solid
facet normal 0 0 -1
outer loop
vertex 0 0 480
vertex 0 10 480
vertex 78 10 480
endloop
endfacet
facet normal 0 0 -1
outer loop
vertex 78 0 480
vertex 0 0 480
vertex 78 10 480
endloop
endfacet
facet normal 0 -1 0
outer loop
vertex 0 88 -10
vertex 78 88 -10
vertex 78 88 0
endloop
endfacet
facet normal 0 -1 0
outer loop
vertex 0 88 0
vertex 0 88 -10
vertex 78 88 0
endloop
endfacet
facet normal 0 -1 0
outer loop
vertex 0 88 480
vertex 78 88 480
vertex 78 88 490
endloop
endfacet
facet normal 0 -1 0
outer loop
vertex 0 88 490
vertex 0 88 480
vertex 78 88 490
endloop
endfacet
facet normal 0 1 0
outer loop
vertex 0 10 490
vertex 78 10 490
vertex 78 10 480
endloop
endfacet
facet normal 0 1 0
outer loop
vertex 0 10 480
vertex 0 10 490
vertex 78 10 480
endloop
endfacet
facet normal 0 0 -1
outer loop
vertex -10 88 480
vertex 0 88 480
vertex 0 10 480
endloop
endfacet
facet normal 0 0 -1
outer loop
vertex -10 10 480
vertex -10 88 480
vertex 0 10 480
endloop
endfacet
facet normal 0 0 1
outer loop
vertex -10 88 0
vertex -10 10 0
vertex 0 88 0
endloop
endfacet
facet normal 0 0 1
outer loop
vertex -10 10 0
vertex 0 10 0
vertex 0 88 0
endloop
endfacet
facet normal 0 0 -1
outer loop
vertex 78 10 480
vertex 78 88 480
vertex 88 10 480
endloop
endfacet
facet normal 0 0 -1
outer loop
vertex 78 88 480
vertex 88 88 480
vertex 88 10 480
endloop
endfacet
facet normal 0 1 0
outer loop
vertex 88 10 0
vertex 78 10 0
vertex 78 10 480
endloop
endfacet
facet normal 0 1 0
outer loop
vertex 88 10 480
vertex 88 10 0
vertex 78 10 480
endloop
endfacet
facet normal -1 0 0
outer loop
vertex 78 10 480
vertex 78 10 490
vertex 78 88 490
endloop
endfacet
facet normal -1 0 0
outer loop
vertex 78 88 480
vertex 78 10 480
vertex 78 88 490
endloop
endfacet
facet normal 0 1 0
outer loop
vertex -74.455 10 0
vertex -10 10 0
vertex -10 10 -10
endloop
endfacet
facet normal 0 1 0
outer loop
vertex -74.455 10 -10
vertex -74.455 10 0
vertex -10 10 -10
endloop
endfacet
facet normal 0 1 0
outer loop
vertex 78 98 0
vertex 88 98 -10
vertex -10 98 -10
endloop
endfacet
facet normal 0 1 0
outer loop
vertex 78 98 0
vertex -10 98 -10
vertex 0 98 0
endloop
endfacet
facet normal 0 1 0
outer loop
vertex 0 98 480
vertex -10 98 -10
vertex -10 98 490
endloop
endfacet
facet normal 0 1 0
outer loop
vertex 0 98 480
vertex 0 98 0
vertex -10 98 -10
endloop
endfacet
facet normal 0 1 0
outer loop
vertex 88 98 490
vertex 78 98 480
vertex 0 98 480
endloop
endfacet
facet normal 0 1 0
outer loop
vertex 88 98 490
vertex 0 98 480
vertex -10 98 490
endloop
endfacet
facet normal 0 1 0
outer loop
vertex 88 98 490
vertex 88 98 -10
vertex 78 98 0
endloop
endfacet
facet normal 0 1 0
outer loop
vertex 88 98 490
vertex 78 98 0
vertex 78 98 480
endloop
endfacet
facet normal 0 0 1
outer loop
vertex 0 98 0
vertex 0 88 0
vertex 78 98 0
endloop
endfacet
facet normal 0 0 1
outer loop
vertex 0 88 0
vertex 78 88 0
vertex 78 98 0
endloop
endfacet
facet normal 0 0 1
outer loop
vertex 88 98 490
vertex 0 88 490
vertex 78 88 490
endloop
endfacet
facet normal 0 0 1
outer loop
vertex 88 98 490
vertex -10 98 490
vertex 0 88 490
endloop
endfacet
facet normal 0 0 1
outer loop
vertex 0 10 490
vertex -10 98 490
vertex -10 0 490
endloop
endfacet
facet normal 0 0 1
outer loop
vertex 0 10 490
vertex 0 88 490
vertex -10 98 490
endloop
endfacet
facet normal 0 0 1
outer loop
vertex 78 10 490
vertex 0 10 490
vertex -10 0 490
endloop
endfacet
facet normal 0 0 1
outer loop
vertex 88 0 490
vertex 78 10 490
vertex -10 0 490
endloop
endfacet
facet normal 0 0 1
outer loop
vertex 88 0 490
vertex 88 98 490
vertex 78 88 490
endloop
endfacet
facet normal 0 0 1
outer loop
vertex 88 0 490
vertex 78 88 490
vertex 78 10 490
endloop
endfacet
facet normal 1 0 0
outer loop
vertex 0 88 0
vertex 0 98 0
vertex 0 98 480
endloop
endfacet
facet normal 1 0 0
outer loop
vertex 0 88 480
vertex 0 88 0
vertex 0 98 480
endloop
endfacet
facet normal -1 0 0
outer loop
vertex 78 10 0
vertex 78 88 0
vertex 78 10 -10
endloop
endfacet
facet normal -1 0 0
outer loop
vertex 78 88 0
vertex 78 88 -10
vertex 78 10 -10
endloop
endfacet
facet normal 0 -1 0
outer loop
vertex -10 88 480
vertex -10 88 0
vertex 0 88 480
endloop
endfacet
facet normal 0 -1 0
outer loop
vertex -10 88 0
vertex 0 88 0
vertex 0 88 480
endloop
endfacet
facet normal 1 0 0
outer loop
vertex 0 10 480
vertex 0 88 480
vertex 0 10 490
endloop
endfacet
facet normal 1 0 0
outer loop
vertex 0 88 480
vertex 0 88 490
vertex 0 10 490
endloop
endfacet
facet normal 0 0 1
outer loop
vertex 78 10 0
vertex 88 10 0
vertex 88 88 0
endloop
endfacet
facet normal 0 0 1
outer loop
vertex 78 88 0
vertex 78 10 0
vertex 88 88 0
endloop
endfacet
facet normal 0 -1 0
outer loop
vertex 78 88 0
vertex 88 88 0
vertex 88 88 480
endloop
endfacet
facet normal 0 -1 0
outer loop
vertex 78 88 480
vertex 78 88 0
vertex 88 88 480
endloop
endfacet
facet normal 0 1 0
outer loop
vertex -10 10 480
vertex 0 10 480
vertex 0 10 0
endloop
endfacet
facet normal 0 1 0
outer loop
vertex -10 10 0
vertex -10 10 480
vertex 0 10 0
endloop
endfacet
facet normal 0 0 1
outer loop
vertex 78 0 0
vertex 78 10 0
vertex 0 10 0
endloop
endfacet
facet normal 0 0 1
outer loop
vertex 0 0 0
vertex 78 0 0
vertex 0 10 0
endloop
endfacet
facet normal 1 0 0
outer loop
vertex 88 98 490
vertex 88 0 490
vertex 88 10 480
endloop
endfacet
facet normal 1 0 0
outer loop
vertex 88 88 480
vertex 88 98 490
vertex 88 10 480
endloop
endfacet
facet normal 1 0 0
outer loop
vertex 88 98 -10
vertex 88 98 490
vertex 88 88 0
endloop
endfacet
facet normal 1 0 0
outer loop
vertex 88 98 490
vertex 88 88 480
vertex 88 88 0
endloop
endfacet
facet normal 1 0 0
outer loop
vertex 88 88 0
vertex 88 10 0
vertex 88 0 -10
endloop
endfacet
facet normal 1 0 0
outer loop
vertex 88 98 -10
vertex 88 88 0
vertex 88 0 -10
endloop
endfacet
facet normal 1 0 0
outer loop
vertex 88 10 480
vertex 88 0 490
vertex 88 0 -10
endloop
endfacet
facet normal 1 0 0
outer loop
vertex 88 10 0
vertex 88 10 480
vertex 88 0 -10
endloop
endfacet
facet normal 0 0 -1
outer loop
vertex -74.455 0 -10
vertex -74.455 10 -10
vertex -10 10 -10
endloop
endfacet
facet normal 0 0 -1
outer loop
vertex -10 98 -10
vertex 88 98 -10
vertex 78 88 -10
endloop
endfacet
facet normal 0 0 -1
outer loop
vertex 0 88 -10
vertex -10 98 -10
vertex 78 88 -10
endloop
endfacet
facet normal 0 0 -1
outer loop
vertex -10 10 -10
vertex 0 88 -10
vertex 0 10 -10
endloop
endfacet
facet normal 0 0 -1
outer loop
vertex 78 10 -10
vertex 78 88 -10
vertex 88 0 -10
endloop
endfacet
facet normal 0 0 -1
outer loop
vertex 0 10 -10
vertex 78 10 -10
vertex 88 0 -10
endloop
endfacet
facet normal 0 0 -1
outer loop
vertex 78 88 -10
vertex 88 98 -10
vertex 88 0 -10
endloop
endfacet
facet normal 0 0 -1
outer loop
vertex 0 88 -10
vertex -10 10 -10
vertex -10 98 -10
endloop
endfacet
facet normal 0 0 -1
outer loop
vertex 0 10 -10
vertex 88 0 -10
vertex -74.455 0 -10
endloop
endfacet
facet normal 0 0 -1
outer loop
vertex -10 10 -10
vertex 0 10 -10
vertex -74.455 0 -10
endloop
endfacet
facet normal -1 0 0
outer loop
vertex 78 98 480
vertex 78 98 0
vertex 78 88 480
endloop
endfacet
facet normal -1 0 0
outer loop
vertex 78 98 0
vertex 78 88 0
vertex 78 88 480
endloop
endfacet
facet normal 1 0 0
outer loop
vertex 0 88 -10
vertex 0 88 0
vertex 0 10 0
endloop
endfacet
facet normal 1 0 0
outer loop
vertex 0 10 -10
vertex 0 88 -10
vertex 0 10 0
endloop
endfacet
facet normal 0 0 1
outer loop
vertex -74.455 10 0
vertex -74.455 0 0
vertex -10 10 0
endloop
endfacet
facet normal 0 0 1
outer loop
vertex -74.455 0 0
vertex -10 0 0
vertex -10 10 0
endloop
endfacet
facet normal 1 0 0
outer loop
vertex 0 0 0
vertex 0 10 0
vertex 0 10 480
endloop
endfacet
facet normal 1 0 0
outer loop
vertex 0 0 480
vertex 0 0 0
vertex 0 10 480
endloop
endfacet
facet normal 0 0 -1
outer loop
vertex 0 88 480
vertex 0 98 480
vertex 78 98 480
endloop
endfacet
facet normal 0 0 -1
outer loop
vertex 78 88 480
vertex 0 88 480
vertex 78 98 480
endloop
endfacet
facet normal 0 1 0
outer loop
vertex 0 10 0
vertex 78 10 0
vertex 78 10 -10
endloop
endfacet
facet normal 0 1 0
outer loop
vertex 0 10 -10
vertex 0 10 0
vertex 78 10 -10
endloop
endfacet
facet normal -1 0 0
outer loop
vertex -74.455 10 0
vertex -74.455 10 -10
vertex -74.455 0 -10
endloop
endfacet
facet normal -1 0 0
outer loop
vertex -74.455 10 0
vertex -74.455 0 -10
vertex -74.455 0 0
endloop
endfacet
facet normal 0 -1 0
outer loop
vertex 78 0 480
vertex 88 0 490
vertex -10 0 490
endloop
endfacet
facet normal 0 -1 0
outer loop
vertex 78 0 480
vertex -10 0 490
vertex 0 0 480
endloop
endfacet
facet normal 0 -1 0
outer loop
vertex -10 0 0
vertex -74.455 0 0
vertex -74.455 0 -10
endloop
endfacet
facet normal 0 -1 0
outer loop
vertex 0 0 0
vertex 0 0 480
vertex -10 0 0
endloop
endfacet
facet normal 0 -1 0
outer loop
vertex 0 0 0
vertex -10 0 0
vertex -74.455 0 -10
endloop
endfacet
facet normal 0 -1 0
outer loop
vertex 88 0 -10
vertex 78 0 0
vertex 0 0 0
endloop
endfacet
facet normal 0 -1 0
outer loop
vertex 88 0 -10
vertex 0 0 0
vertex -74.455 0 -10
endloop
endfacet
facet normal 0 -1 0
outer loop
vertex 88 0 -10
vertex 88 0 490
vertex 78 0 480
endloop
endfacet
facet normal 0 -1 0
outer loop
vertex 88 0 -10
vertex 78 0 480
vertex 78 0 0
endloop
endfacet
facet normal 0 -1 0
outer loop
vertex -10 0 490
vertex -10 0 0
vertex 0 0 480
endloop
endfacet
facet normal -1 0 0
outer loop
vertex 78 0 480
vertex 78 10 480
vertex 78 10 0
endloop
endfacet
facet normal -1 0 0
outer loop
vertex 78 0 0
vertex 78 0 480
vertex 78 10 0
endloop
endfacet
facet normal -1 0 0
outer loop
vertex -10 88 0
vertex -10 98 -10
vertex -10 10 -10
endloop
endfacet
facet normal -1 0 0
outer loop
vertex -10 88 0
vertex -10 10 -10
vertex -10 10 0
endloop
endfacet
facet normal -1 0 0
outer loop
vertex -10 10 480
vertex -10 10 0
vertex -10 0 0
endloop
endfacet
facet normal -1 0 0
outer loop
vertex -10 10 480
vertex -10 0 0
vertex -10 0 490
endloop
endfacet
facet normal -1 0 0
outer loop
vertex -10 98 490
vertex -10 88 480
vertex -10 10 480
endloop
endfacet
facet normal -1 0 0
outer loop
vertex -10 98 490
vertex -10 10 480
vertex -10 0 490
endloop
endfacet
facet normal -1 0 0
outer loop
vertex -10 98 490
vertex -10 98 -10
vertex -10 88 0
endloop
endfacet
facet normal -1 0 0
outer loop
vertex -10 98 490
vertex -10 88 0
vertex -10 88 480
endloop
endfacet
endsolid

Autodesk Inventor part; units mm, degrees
ref_plane "YZ Plane" through (0, 0, 0) normal (1, 0, 0) x (0, 1, 0)
ref_plane "XZ Plane" through (0, 0, 0) normal (0, 1, 0) x (-1, 0, 0)
ref_plane "XY Plane" through (0, 0, 0) normal (0, 0, 1) x (1, 0, 0)
sketch "Sketch1" plane through (0, 0, 0) normal (0, 0, 1) x (1, 0, 0)
  line L0 (0, 0) -> (68, 0)
  line L1 (68, 0) -> (68, 68)
  line L2 (68, 68) -> (0, 68)
  line L3 (0, 68) -> (0, 0)
  dimension "d1" = 68
  dimension "d2" = 68
extrude "Extrusion1" add sketch "Sketch1" along normal blind 480
sketch "Sketch2" plane through (0, 0, 480) normal (0, 0, 1) x (1, 0, 0)
  line L0 (10, 58) -> (58, 58)
  line L1 (58, 58) -> (58, 10)
  line L2 (58, 10) -> (10, 10)
  line L3 (10, 10) -> (10, 58)
  line L4 (68, 68) -> (0, 68) projected
  line L5 (0, 68) -> (0, 0) projected
  line L6 (0, 0) -> (68, 0) projected
  line L7 (68, 0) -> (68, 68) projected
  dimension "d5" = 10
  dimension "d6" = 10
  dimension "d7" = 10
  dimension "d8" = 10
extrude "Extrusion2" cut sketch "Sketch2" against normal blind 900 contours L0 L1 L2 L3
sketch "Sketch3" plane through (68, 0, 0) normal (1, 0, 0) x (0, 0, -1)
  line L0 (-470, 58) -> (-10, 58)
  line L1 (-10, 58) -> (-10, 10)
  line L2 (-10, 10) -> (-470, 10)
  line L3 (-470, 10) -> (-470, 58)
  line L4 (0, 68) -> (-480, 68) projected
  line L5 (-480, 0) -> (-480, 68) projected
  line L6 (0, 0) -> (-480, 0) projected
  line L7 (0, 0) -> (0, 68) projected
  dimension "d11" = 10
  dimension "d12" = 10
  dimension "d13" = 10
  dimension "d14" = 10
extrude "Extrusion3" cut sketch "Sketch3" against normal blind 900 contours L0 L1 L2 L3
sketch "Sketch4" plane through (0, 68, 0) normal (0, 1, 0) x (1, 0, 0)
  line L0 (68, -10) -> (58, -10) projected
  line L1 (10, -480) -> (10, -470) projected
  line L2 (58, -10) -> (10, -10)
  line L3 (10, -10) -> (10, -470)
  line L4 (10, -470) -> (58, -470)
  line L5 (58, -470) -> (58, -10)
  point P0 (0, 0)
extrude "Extrusion4" cut sketch "Sketch4" against normal blind 900
sketch "Sketch5" plane through (0, 0, 480) normal (0, 0, 1) x (1, 0, 0)
  line L0 (68, 68) -> (0, 68) projected
  line L1 (0, 0) -> (68, 0) projected
  line L2 (0, 68) -> (68, 68)
  line L3 (68, 68) -> (68, 0)
  line L4 (68, 0) -> (0, 0)
  line L5 (0, 0) -> (0, 68)
  line L6 (10, 58) -> (0, 58) projected
  line L7 (58, 58) -> (58, 10) projected
  line L8 (10, 58) -> (58, 58)
  line L9 (58, 58) -> (58, 10)
  line L10 (58, 10) -> (10, 10)
  line L11 (10, 10) -> (10, 58)
extrude "Extrusion5" add sketch "Sketch5" along normal blind 10
sketch "Sketch6" plane through (0, 68, 0) normal (0, 1, 0) x (1, 0, 0)
  line L0 (58, -490) -> (58, -470) projected
  line L1 (10, -490) -> (10, -470) projected
  line L2 (58, -470) -> (10, -470)
  line L3 (10, -470) -> (10, -480)
  line L4 (10, -480) -> (58, -480)
  line L5 (58, -480) -> (58, -470)
  point P0 (0, 0)
extrude "Extrusion6" cut sketch "Sketch6" against normal blind 900
sketch "Sketch7" plane through (68, 0, 0) normal (1, 0, 0) x (0, 0, -1)
  line L0 (-470, 10) -> (-470, 58) projected
  line L1 (-480, 10) -> (-480, 0) projected
  line L2 (-470, 58) -> (-480, 58)
  line L3 (-480, 58) -> (-480, 10)
  line L4 (-480, 10) -> (-470, 10)
  line L5 (-470, 10) -> (-470, 58)
  point P0 (0, 0)
extrude "Extrusion7" cut sketch "Sketch7" against normal blind 900
sketch "Sketch8" plane through (0, 0, 0) normal (0, 0, -1) x (-1, 0, 0)
  line L0 (-68, 0) -> (-68, 68) projected
  line L1 (-68, 68) -> (0, 68)
  line L2 (0, 68) -> (0, 0)
  line L3 (0, 0) -> (-68, 0)
  line L4 (-68, 0) -> (-68, 68)
  line L5 (-58, 58) -> (-10, 58)
  line L6 (-10, 58) -> (-10, 10)
  line L7 (-10, 10) -> (-58, 10)
  line L8 (-58, 10) -> (-58, 58)
extrude "Extrusion8" add sketch "Sketch8" along normal blind 10
sketch "Sketch9" plane through (0, 68, 490) normal (0, 1, 0) x (1, 0, 0)
  line L0 (10, 480) -> (10, 500) projected
  line L1 (58, 480) -> (58, 500) projected
  line L2 (10, 480) -> (58, 480)
  line L3 (58, 480) -> (58, 490)
  line L4 (58, 490) -> (10, 490)
  line L5 (10, 490) -> (10, 480)
  point P0 (0, 490)
extrude "Extrusion9" cut sketch "Sketch9" against normal blind 900
sketch "Sketch10" plane through (68, 0, 490) normal (1, 0, 0) x (0, 0, -1)
  line L0 (10, 58) -> (480, 58) projected
  line L1 (490, 10) -> (500, 10) projected
  line L2 (480, 58) -> (490, 58)
  line L3 (490, 58) -> (490, 10)
  line L4 (490, 10) -> (480, 10)
  line L5 (480, 10) -> (480, 58)
  point P0 (490, 0)
extrude "Extrusion10" cut sketch "Sketch10" against normal blind 900
sketch "Sketch11" plane through (68, 0, 490) normal (1, 0, 0) x (0, 0, -1)
  line L0 (0, 68) -> (0, 0) projected
  line L1 (500, 0) -> (500, 68) projected
  line L2 (0, 68) -> (500, 68)
  line L3 (500, 68) -> (500, 0)
  line L4 (500, 0) -> (0, 0)
  line L5 (0, 0) -> (0, 68)
  line L6 (490, 58) -> (490, 10) projected
  line L7 (10, 58) -> (490, 58)
  line L8 (490, 58) -> (490, 10)
  line L9 (490, 10) -> (10, 10)
  line L10 (10, 10) -> (10, 58)
  point P0 (490, 0)
extrude "Extrusion11" add sketch "Sketch11" along normal blind 20
sketch "Sketch12" plane through (0, 68, 490) normal (0, 1, 0) x (1, 0, 0)
  line L0 (58, 10) -> (58, 490) projected
  line L1 (88, 490) -> (58, 490) projected
  line L2 (58, 10) -> (78, 10)
  line L3 (78, 10) -> (78, 490)
  line L4 (78, 490) -> (58, 490)
  line L5 (58, 490) -> (58, 10)
  point P0 (0, 490)
  dimension "d33" = 20
extrude "Extrusion12" cut sketch "Sketch12" against normal blind 900
sketch "Sketch13" plane through (0, 0, -10) normal (0, 0, -1) x (-1, 0, 0)
  line L0 (-58, 58) -> (-10, 58) projected
  line L1 (-58, 58) -> (-78, 58)
  line L2 (-78, 58) -> (-78, 10)
  line L3 (-78, 10) -> (-58, 10)
  line L4 (-58, 10) -> (-58, 58)
  point P0 (0, 0)
  dimension "d36" = 20
extrude "Extrusion13" cut sketch "Sketch13" against normal blind 900
sketch "Sketch14" plane through (0, 68, 490) normal (0, 1, 0) x (1, 0, 0)
  line L0 (0, 0) -> (88, 0) projected
  line L1 (0, 500) -> (88, 500) projected
  line L2 (0, 0) -> (88, 0)
  line L3 (88, 0) -> (88, 500)
  line L4 (88, 500) -> (0, 500)
  line L5 (0, 500) -> (0, 0)
  line L6 (10, 10) -> (10, 490) projected
  line L7 (78, 10) -> (78, 490) projected
  line L8 (10, 10) -> (78, 10)
  line L9 (78, 10) -> (78, 490)
  line L10 (78, 490) -> (10, 490)
  line L11 (10, 490) -> (10, 10)
  point P0 (0, 490)
extrude "Extrusion14" add sketch "Sketch14" along normal blind 10
sketch "Sketch15" plane through (88, 0, 490) normal (1, 0, 0) x (0, 0, -1)
  line L0 (10, 58) -> (490, 58) projected
  line L1 (490, 78) -> (490, 58) projected
  line L2 (10, 58) -> (490, 58)
  line L3 (490, 58) -> (490, 68)
  line L4 (490, 68) -> (10, 68)
  line L5 (10, 68) -> (10, 58)
  point P0 (490, 0)
extrude "Extrusion15" cut sketch "Sketch15" against normal blind 900
sketch "Sketch16" plane through (0, 0, -10) normal (0, 0, -1) x (-1, 0, 0)
  line L0 (-78, 10) -> (-78, 58) projected
  line L1 (-10, 68) -> (0, 68) projected
  line L2 (-78, 58) -> (-10, 58)
  line L3 (-10, 58) -> (-10, 68)
  line L4 (-10, 68) -> (-78, 68)
  line L5 (-78, 68) -> (-78, 58)
  point P0 (0, 0)
extrude "Extrusion16" cut sketch "Sketch16" against normal blind 900
sketch "Sketch17" plane through (0, 78, 490) normal (0, 1, 0) x (1, 0, 0)
  line L0 (88, 0) -> (88, 500) projected
  line L1 (0, 0) -> (88, 0) projected
  line L2 (88, 500) -> (0, 500)
  line L3 (0, 500) -> (0, 0)
  line L4 (0, 0) -> (88, 0)
  line L5 (88, 0) -> (88, 500)
  line L6 (78, 490) -> (78, 10) projected
  line L7 (10, 10) -> (10, 490) projected
  line L8 (78, 490) -> (10, 490)
  line L9 (10, 490) -> (10, 10)
  line L10 (10, 10) -> (78, 10)
  line L11 (78, 10) -> (78, 490)
  point P0 (0, 490)
extrude "Extrusion17" add sketch "Sketch17" along normal blind 20
sketch "Sketch18" plane through (88, 0, 490) normal (1, 0, 0) x (0, 0, -1)
  line L0 (490, 68) -> (10, 68) projected
  line L1 (10, 68) -> (490, 68)
  line L2 (490, 68) -> (490, 88)
  line L3 (490, 88) -> (10, 88)
  line L4 (10, 88) -> (10, 68)
  point P0 (490, 0)
  dimension "d47" = 20
extrude "Extrusion18" cut sketch "Sketch18" against normal blind 900
sketch "Sketch19" plane through (0, 0, 490) normal (0, 0, 1) x (1, 0, 0)
  line L0 (10, 68) -> (10, 10) projected
  line L1 (78, 88) -> (78, 98) projected
  line L2 (10, 68) -> (78, 68)
  line L3 (78, 68) -> (78, 88)
  line L4 (78, 88) -> (10, 88)
  line L5 (10, 88) -> (10, 68)
  point P0 (0, 0)
extrude "Extrusion19" cut sketch "Sketch19" against normal blind 900
sketch "Sketch20" plane through (0, 0, -10) normal (-1, 0, 0) x (0, 0, 1)
  line L0 (0, 98) -> (500, 98) projected
  line L1 (0, 98) -> (500, 98)
  line L2 (500, 98) -> (500, 0)
  line L3 (500, 0) -> (0, 0)
  line L4 (0, 0) -> (0, 98)
  line L5 (10, 88) -> (490, 88) projected
  line L6 (490, 10) -> (10, 10) projected
  line L7 (10, 88) -> (490, 88)
  line L8 (490, 88) -> (490, 10)
  line L9 (490, 10) -> (10, 10)
  line L10 (10, 10) -> (10, 88)
  point P0 (10, 0)
extrude "Extrusion20" add sketch "Sketch20" along normal blind 10
sketch "Sketch21" plane through (0, 0, 490) normal (0, 0, 1) x (1, 0, 0)
  line L0 (78, 88) -> (10, 88) projected
  line L1 (10, 10) -> (-10, 10) projected
  line L2 (10, 88) -> (0, 88)
  line L3 (0, 88) -> (0, 10)
  line L4 (0, 10) -> (10, 10)
  line L5 (10, 10) -> (10, 88)
  point P0 (0, 0)
extrude "Extrusion21" cut sketch "Sketch21" against normal blind 900
sketch "Sketch22" plane through (0, 98, 490) normal (0, 1, 0) x (1, 0, 0)
  line L0 (10, 490) -> (78, 490) projected
  line L1 (0, 10) -> (-10, 10) projected
  line L2 (10, 490) -> (0, 490)
  line L3 (0, 490) -> (0, 10)
  line L4 (0, 10) -> (10, 10)
  line L5 (10, 10) -> (10, 490)
  point P0 (0, 490)
extrude "Extrusion22" cut sketch "Sketch22" against normal blind 900
sketch "Sketch24" plane through (-10, 0, -10) normal (-1, 0, 0) x (0, 0, 1)
  line L0 (500, 0) -> (0, 0) projected
  line L1 (10, 88) -> (10, 10) projected
  line L2 (0, 0) -> (10, 0)
  line L3 (10, 0) -> (10, 10)
  line L4 (10, 10) -> (0, 10)
  line L5 (0, 10) -> (0, 0)
  point P0 (10, 0)
extrude "Extrusion24" add sketch "Sketch24" along normal blind 64.455
properties part number "Accumalator Housing"
